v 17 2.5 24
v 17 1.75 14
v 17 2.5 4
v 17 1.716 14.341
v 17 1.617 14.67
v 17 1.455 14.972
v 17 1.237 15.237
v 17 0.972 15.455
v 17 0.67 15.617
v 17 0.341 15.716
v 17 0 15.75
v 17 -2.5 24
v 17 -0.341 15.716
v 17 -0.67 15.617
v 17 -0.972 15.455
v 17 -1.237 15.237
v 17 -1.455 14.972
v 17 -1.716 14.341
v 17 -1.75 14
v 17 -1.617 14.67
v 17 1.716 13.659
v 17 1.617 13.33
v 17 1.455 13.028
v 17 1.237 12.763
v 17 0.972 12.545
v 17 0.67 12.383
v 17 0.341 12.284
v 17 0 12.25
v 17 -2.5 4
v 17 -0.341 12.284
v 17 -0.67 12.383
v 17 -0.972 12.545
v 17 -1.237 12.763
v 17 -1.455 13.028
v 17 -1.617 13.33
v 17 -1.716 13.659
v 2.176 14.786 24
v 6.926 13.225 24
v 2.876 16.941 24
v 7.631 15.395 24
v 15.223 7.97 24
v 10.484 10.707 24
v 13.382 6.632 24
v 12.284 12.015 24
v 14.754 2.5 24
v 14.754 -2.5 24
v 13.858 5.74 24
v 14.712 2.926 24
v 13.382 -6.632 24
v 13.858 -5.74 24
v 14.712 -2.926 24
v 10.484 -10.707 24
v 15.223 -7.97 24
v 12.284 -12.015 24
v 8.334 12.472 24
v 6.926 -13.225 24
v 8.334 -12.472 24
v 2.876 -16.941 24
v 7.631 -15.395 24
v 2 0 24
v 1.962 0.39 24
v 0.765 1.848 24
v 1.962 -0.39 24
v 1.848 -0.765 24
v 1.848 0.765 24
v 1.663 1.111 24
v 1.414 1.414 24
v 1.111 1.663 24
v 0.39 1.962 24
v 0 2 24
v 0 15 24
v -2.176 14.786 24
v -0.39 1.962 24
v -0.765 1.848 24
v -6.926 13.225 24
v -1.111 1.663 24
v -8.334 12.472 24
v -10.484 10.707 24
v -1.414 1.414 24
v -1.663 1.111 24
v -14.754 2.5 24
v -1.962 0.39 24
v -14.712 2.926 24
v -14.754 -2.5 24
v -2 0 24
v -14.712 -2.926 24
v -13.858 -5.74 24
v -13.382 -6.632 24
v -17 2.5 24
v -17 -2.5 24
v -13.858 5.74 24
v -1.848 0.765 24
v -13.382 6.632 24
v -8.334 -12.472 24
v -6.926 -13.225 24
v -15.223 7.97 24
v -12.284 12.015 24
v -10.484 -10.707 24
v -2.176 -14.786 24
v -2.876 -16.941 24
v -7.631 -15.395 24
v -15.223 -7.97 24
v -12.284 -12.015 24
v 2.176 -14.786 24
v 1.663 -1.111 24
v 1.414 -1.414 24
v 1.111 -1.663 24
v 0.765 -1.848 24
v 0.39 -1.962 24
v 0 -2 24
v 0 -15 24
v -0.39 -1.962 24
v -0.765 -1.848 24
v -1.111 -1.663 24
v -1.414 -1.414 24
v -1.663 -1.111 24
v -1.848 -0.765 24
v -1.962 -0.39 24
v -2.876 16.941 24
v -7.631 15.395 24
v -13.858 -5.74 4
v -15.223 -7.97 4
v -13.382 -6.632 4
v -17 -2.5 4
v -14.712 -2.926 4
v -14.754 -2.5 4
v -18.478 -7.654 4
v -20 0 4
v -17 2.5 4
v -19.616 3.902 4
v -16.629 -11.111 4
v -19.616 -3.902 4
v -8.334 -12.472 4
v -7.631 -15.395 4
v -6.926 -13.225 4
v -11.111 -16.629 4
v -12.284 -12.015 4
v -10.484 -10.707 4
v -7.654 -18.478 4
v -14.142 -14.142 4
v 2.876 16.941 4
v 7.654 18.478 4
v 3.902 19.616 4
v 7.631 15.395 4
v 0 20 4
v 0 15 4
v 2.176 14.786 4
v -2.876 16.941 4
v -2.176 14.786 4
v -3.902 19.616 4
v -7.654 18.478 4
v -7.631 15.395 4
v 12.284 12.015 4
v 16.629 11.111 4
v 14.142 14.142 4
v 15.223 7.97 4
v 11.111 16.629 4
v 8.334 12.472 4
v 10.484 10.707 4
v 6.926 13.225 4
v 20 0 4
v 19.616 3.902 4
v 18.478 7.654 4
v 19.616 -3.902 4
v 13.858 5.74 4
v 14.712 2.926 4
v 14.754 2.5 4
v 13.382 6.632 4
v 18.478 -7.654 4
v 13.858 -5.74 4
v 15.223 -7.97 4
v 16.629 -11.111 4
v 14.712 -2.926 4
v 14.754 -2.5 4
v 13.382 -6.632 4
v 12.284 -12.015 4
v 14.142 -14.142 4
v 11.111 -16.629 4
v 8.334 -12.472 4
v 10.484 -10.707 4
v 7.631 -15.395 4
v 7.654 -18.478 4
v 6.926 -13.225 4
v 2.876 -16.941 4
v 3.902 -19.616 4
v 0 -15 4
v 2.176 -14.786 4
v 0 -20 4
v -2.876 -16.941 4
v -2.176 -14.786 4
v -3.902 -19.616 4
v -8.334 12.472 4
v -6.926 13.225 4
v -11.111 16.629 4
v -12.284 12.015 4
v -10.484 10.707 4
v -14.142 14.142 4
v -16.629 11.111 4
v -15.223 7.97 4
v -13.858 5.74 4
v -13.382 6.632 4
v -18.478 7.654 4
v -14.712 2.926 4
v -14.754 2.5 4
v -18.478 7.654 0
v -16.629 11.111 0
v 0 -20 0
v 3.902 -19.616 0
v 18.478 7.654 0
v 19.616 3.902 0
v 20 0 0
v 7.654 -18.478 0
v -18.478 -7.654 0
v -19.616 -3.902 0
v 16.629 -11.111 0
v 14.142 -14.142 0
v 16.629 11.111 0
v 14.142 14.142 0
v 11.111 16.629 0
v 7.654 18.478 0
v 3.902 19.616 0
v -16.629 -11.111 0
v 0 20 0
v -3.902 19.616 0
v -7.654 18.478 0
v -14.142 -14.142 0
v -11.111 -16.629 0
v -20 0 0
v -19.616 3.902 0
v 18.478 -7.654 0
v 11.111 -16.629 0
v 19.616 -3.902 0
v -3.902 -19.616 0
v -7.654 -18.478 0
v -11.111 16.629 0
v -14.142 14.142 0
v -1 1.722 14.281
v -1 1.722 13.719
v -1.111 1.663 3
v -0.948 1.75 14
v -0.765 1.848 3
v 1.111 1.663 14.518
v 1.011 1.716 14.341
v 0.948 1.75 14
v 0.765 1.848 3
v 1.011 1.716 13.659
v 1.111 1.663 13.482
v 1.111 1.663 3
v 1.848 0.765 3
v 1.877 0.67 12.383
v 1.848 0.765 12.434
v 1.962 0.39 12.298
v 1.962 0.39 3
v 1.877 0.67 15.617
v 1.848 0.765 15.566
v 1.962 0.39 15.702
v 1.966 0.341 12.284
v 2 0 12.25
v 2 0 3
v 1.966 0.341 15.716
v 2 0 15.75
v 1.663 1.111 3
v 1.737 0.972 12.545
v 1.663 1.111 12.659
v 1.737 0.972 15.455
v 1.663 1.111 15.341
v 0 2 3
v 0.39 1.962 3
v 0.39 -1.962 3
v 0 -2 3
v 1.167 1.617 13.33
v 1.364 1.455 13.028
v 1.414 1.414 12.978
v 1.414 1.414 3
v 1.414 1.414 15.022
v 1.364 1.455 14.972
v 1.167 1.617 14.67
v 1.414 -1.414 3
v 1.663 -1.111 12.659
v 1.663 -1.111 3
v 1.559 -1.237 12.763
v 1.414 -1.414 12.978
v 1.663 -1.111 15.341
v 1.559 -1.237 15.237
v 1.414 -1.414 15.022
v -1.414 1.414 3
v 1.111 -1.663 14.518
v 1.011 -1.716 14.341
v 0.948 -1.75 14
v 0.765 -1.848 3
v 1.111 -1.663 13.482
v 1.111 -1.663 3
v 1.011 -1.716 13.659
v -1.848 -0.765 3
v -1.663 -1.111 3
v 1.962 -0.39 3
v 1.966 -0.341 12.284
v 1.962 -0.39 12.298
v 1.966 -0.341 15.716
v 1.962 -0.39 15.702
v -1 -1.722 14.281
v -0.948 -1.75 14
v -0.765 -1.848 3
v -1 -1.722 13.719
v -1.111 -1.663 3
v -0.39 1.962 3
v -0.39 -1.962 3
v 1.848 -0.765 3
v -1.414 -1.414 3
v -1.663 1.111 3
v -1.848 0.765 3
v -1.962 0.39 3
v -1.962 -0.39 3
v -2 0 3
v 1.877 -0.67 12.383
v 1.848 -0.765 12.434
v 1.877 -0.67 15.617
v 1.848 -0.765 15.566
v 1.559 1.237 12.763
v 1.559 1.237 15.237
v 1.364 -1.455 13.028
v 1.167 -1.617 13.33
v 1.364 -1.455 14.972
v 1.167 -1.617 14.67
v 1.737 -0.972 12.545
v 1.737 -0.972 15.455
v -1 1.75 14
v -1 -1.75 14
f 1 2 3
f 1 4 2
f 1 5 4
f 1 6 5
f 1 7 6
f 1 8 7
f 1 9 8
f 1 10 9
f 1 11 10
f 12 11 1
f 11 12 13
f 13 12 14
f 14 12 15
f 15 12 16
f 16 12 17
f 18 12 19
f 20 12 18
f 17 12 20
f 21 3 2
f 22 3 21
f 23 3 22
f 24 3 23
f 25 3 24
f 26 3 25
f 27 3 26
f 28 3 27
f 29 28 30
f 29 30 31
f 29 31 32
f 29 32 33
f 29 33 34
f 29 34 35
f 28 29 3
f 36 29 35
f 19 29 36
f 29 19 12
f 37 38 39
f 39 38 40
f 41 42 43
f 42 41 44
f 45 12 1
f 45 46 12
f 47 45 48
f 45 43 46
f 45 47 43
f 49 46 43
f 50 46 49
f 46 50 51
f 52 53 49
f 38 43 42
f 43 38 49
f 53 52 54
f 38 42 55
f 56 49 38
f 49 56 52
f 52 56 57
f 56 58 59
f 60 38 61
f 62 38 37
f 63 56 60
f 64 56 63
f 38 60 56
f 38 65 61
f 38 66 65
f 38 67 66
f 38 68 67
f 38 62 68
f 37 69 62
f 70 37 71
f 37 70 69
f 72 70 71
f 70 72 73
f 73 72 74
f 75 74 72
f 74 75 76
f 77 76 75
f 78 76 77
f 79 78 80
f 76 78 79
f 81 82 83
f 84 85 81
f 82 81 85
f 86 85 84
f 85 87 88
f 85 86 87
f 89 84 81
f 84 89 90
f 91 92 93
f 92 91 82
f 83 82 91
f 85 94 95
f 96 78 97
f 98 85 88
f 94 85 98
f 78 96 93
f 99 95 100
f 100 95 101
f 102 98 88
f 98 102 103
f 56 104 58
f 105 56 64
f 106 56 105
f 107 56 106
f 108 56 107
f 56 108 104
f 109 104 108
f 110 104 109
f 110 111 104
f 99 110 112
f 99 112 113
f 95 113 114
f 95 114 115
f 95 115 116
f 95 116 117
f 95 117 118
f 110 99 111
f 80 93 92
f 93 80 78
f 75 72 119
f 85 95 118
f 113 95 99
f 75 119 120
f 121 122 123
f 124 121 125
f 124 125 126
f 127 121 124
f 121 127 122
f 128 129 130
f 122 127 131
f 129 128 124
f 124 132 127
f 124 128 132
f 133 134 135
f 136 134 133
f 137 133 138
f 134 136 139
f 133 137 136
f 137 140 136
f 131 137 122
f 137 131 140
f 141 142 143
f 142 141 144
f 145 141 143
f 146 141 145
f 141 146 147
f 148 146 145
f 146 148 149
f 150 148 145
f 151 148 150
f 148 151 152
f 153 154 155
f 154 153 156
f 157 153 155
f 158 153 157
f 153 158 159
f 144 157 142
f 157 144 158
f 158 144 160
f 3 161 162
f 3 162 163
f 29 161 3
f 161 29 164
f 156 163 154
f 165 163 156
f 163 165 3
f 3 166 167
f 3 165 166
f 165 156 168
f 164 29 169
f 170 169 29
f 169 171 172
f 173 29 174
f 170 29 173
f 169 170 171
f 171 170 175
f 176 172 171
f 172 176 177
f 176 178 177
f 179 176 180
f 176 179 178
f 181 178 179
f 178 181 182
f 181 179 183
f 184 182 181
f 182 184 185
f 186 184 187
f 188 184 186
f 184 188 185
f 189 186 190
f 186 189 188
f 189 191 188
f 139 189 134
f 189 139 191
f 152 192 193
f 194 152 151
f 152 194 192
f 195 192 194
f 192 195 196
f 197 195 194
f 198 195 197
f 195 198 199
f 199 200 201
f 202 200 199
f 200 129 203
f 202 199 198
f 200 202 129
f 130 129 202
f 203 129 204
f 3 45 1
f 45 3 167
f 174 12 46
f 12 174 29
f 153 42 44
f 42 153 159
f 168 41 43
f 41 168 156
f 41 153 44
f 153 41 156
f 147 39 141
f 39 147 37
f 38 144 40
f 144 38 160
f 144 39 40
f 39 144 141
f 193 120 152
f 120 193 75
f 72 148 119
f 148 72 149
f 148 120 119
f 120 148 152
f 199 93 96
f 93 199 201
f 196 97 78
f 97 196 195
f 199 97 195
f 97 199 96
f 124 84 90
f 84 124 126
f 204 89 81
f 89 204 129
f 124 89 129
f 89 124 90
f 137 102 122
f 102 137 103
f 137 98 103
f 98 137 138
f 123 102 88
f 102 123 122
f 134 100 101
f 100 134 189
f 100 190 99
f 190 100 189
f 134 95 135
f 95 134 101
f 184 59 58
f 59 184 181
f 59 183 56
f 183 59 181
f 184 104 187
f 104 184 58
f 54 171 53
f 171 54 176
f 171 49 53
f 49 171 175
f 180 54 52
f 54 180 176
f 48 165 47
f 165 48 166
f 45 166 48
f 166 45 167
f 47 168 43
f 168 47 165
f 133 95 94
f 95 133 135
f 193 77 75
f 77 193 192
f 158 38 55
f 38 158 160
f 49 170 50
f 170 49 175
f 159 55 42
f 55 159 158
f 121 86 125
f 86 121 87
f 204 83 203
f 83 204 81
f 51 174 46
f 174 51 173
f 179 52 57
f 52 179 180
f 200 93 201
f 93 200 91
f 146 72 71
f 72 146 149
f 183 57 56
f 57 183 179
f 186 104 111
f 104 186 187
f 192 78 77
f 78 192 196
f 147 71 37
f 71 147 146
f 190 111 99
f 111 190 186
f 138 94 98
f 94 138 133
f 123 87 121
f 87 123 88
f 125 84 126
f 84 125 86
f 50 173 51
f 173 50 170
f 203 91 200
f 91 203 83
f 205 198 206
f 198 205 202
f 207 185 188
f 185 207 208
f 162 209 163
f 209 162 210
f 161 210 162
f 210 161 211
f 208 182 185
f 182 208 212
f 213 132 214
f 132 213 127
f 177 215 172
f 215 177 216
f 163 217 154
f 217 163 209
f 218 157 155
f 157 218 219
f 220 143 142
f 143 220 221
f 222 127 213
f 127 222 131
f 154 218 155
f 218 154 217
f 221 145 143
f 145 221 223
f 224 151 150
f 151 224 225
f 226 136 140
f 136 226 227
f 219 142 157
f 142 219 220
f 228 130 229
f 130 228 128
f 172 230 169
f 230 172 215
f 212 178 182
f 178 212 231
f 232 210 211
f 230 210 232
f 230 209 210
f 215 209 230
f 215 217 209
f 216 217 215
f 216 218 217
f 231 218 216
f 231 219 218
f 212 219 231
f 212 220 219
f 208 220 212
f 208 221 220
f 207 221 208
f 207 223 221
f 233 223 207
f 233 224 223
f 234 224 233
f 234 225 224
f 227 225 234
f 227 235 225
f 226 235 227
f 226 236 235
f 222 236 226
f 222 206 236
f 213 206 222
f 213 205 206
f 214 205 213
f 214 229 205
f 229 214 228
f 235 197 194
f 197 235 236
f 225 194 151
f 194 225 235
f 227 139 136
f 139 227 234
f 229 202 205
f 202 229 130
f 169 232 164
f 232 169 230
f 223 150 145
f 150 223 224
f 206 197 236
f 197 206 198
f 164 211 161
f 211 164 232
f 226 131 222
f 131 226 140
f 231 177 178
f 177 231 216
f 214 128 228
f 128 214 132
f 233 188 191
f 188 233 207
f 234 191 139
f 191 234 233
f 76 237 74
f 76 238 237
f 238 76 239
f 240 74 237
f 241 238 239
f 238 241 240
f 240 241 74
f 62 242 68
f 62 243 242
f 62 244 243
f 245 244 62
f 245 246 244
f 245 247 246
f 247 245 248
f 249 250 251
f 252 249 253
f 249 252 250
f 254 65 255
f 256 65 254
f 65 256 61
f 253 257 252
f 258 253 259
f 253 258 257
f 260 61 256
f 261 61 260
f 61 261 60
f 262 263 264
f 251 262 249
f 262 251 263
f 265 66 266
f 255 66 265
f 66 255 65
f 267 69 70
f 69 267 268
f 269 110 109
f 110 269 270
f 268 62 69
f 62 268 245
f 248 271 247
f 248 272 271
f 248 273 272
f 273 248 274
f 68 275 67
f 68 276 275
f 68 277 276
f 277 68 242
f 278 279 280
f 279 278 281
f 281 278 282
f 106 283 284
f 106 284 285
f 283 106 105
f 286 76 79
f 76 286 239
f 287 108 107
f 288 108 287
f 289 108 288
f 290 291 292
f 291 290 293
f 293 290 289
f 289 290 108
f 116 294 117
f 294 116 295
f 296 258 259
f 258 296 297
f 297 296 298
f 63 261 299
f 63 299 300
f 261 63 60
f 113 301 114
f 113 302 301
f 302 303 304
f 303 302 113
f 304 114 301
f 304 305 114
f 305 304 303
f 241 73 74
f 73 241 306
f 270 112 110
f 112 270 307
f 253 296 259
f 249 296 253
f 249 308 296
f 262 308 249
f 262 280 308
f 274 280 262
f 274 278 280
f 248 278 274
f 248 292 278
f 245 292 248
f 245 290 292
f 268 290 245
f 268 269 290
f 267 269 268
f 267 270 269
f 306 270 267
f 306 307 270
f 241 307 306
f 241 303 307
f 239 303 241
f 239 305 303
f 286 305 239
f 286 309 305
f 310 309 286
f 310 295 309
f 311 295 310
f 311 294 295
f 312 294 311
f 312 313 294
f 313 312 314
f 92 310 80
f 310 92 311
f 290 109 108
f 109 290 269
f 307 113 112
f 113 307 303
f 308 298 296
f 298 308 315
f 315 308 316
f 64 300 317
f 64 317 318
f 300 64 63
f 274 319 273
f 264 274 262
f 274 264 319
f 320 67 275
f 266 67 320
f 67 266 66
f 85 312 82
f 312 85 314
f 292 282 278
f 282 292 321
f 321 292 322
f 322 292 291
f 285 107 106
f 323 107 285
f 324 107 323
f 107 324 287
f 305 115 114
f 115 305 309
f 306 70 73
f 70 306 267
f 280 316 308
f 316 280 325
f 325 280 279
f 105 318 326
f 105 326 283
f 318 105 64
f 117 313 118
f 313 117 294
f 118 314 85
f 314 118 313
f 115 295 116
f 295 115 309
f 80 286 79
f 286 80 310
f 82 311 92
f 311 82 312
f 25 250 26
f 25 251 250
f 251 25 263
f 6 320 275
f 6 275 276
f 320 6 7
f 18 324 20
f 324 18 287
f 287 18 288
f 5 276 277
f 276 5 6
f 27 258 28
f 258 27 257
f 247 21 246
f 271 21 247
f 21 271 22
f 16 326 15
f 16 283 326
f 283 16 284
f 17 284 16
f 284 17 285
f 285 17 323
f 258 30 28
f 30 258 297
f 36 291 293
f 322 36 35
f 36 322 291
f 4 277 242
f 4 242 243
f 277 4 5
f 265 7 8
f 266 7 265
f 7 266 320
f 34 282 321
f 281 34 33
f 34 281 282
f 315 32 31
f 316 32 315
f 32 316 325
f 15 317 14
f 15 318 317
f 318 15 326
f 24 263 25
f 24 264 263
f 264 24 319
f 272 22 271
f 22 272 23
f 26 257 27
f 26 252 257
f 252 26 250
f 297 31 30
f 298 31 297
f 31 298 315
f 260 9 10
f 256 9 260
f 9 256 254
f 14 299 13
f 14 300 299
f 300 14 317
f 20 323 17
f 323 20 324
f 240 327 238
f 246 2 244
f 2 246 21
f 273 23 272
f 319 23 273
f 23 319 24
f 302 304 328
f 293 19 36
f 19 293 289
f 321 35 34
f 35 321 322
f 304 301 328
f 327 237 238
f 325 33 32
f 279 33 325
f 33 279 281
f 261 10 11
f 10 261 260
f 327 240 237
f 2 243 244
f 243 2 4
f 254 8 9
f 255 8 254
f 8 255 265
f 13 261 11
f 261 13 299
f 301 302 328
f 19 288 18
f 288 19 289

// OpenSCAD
$fn = 32;

// ----------------------------------------------------------------------
// Control knob: skirt knob with grip ribs
// ----------------------------------------------------------------------

// --- parameters (mm) ---
skirt_d = 40;             // skirt diameter
skirt_t = 4;              // skirt thickness
rib_w = 5;                // grip rib width
rib_out = 3;              // grip rib radial protrusion
n_ribs = 10;              // number of grip ribs
knob_d = 30;              // knob body diameter
knob_h = 20;              // knob body height
bore_d = 4;               // shaft bore diameter
set_d = 3.5;              // set screw bore diameter

rib_step = 360 / n_ribs;  // rib angular step
total_h = skirt_t + knob_h;  // overall height

difference() {
  union() {
    translate([0, 0, skirt_t]) cylinder(h = knob_h, d = knob_d);
    cylinder(h = skirt_t, d = skirt_d);
    for (i = [0 : n_ribs - 1])
      rotate([0, 0, i * rib_step])
        translate([knob_d / 2 - 1, -rib_w / 2, skirt_t])
          cube([rib_out, rib_w, knob_h]);
  }
  translate([0, 0, skirt_t - 1]) cylinder(h = knob_h + 2, d = bore_d);
  translate([-1, 0, skirt_t + knob_h / 2]) rotate([0, 90, 0])
    cylinder(h = knob_d / 2 + bore_d / 2 + 2, d = set_d);
}
